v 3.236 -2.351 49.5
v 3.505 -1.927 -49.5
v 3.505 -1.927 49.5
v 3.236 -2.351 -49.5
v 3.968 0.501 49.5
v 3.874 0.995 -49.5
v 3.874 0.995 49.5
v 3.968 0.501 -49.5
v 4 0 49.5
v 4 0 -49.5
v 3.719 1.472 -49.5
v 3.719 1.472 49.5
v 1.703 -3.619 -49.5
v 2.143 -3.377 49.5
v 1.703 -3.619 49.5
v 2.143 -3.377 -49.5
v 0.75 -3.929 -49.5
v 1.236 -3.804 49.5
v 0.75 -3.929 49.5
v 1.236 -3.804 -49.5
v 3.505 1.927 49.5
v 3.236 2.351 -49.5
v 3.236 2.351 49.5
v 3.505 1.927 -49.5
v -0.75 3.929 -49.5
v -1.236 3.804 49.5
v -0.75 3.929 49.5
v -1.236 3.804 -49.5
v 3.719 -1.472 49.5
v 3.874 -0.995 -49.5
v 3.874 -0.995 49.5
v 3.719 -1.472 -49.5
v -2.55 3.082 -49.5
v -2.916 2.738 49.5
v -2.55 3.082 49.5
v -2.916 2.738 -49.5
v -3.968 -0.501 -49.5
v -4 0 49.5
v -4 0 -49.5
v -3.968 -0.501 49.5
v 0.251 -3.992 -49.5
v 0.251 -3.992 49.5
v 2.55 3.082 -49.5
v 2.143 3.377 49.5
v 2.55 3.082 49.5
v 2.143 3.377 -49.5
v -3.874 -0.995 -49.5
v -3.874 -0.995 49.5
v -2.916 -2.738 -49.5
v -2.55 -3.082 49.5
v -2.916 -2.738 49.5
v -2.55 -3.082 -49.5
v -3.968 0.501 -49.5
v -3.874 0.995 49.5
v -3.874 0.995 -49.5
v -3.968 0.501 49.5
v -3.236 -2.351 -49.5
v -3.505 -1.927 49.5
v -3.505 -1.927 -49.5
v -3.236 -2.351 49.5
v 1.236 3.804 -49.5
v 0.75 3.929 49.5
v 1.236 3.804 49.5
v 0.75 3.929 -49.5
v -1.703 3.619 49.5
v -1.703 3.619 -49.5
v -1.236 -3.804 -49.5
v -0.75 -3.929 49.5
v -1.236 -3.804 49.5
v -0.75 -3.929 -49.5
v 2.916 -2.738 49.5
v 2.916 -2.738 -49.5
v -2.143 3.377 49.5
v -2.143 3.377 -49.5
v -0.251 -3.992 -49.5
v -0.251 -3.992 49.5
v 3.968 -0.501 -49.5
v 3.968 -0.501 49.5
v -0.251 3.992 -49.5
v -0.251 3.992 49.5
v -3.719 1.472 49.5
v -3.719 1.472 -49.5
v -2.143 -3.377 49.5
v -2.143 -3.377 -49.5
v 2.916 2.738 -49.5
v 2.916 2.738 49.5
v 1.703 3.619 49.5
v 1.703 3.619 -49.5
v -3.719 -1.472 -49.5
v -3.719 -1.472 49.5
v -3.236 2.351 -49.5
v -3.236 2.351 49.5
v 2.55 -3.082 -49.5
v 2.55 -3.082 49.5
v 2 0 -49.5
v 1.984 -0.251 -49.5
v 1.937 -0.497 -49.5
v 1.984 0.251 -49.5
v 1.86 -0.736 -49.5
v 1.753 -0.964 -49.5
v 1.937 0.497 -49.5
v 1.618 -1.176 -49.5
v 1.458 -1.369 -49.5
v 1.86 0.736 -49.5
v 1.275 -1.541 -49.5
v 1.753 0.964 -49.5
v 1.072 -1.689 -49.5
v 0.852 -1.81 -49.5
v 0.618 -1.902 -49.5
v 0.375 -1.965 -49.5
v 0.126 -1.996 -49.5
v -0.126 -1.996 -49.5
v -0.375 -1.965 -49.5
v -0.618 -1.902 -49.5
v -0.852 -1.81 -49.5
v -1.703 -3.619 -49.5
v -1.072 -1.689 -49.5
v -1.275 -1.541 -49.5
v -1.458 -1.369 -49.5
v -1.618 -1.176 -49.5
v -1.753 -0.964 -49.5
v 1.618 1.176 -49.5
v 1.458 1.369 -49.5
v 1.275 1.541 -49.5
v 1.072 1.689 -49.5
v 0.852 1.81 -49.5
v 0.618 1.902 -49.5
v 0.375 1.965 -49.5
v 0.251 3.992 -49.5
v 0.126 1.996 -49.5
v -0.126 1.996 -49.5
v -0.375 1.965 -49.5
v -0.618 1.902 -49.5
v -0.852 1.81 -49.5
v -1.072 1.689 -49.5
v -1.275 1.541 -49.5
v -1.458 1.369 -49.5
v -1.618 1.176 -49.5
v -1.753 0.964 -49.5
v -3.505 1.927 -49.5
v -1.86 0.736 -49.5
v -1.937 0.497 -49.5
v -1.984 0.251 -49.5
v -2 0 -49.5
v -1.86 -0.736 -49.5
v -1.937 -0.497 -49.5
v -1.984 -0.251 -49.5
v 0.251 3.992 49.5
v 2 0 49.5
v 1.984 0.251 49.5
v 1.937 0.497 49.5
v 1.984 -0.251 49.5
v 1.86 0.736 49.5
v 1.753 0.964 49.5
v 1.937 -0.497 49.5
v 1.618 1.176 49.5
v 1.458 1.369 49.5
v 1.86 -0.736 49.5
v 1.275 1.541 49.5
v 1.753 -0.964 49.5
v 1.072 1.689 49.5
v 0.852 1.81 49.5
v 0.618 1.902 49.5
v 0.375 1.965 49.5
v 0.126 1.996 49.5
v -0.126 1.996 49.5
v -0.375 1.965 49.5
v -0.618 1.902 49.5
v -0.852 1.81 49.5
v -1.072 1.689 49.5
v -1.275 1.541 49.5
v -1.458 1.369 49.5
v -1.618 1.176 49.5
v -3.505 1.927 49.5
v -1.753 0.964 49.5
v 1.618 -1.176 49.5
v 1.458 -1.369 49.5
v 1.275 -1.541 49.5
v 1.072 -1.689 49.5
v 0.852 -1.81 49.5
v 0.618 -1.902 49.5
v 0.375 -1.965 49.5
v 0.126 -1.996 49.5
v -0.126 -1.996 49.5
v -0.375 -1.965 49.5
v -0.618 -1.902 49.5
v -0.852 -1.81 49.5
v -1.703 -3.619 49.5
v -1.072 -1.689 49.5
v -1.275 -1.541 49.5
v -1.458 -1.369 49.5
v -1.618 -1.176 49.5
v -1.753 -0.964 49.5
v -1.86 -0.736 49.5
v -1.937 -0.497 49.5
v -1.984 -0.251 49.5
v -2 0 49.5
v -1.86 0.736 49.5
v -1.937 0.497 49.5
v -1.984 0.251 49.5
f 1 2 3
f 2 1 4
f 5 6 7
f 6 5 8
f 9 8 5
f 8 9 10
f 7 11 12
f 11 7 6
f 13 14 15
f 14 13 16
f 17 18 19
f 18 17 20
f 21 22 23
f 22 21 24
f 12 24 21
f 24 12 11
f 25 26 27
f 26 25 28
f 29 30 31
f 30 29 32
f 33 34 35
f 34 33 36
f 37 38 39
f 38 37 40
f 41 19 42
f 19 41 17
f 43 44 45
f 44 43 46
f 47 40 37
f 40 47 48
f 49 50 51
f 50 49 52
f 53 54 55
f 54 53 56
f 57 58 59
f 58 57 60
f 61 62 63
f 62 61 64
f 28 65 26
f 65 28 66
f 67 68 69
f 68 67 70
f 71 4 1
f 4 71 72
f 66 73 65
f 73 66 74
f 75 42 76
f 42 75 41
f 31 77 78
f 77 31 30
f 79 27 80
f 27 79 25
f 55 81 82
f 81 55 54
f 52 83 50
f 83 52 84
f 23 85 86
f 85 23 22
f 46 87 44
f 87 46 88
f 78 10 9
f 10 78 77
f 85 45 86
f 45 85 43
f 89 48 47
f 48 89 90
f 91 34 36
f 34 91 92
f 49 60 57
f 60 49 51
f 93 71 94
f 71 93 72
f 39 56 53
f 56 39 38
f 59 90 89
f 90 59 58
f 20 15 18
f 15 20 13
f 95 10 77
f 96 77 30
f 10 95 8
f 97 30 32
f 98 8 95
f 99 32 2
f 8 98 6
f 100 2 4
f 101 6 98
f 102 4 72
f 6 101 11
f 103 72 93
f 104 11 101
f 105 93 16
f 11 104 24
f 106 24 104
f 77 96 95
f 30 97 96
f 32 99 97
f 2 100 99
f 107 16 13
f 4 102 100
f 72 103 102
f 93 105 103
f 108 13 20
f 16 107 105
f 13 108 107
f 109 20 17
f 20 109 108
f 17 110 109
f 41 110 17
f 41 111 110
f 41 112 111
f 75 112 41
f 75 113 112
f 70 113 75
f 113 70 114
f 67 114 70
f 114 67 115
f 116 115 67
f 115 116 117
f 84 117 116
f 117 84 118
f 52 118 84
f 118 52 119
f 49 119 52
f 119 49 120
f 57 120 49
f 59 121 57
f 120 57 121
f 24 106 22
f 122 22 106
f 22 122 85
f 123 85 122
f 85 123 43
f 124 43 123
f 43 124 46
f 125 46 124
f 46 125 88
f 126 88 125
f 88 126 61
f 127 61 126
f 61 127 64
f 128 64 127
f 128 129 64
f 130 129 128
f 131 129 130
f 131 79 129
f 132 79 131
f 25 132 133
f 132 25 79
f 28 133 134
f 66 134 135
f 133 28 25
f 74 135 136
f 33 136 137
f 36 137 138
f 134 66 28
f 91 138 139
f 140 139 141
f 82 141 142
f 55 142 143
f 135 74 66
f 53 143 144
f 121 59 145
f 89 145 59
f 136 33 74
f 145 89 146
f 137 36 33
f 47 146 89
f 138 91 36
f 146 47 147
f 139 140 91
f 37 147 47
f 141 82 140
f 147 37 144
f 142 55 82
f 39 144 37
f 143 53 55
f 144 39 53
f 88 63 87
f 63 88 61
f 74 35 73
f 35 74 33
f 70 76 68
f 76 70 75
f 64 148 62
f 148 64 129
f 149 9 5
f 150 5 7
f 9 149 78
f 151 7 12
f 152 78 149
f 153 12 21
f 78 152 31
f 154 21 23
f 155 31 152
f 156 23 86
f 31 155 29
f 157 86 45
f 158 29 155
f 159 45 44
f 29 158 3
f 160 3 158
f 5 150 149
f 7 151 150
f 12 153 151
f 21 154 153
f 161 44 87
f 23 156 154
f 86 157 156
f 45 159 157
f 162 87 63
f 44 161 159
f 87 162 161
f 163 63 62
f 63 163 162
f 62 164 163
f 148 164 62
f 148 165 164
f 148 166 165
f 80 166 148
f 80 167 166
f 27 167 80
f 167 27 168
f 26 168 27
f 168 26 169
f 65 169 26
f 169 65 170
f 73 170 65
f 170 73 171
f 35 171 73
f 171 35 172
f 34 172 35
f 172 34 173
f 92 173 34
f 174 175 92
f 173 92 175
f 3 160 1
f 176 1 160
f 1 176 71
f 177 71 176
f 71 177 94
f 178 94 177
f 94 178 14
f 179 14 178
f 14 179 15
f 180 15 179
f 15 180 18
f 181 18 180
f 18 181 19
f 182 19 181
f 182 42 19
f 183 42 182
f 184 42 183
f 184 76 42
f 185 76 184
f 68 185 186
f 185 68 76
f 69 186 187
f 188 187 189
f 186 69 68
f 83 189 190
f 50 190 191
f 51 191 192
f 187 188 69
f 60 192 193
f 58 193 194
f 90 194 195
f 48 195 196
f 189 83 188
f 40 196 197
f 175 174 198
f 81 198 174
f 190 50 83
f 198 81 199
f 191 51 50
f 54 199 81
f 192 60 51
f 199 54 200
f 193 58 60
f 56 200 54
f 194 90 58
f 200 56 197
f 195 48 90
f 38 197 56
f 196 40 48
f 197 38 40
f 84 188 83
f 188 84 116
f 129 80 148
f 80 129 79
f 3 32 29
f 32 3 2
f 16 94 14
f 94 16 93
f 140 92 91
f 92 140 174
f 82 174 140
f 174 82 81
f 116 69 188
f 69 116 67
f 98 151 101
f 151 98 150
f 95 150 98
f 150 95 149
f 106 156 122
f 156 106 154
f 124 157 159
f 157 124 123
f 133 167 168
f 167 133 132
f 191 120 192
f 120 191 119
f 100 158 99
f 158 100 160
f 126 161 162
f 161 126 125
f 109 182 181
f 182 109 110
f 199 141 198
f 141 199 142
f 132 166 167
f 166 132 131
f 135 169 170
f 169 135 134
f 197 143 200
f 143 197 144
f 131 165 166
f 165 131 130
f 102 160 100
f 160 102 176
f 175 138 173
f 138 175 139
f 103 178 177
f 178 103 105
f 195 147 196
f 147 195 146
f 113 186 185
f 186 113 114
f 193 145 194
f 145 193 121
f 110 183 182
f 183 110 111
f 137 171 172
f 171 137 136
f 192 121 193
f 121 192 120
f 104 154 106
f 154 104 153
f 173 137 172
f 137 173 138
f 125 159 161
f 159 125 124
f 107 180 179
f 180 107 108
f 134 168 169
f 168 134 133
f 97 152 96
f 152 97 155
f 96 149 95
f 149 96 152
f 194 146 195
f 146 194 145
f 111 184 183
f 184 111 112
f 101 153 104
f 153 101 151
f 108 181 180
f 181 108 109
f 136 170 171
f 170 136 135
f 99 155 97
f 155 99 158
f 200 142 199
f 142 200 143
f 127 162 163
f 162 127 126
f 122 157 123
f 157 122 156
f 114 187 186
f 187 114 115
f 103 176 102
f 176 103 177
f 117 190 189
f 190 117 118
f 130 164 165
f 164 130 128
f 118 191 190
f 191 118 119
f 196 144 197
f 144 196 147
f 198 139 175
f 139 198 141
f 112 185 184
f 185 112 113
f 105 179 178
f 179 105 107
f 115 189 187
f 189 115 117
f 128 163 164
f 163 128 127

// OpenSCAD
$fn = 50;


difference() {
	union() {
		translate(v = [0, 0, -49.5000000000]) {
			cylinder(h = 99, r = 4.0000000000);
		}
	}
	union() {
		translate(v = [0, 0, -100.0000000000]) {
			cylinder(h = 200, r = 2.0000000000);
		}
	}
}
